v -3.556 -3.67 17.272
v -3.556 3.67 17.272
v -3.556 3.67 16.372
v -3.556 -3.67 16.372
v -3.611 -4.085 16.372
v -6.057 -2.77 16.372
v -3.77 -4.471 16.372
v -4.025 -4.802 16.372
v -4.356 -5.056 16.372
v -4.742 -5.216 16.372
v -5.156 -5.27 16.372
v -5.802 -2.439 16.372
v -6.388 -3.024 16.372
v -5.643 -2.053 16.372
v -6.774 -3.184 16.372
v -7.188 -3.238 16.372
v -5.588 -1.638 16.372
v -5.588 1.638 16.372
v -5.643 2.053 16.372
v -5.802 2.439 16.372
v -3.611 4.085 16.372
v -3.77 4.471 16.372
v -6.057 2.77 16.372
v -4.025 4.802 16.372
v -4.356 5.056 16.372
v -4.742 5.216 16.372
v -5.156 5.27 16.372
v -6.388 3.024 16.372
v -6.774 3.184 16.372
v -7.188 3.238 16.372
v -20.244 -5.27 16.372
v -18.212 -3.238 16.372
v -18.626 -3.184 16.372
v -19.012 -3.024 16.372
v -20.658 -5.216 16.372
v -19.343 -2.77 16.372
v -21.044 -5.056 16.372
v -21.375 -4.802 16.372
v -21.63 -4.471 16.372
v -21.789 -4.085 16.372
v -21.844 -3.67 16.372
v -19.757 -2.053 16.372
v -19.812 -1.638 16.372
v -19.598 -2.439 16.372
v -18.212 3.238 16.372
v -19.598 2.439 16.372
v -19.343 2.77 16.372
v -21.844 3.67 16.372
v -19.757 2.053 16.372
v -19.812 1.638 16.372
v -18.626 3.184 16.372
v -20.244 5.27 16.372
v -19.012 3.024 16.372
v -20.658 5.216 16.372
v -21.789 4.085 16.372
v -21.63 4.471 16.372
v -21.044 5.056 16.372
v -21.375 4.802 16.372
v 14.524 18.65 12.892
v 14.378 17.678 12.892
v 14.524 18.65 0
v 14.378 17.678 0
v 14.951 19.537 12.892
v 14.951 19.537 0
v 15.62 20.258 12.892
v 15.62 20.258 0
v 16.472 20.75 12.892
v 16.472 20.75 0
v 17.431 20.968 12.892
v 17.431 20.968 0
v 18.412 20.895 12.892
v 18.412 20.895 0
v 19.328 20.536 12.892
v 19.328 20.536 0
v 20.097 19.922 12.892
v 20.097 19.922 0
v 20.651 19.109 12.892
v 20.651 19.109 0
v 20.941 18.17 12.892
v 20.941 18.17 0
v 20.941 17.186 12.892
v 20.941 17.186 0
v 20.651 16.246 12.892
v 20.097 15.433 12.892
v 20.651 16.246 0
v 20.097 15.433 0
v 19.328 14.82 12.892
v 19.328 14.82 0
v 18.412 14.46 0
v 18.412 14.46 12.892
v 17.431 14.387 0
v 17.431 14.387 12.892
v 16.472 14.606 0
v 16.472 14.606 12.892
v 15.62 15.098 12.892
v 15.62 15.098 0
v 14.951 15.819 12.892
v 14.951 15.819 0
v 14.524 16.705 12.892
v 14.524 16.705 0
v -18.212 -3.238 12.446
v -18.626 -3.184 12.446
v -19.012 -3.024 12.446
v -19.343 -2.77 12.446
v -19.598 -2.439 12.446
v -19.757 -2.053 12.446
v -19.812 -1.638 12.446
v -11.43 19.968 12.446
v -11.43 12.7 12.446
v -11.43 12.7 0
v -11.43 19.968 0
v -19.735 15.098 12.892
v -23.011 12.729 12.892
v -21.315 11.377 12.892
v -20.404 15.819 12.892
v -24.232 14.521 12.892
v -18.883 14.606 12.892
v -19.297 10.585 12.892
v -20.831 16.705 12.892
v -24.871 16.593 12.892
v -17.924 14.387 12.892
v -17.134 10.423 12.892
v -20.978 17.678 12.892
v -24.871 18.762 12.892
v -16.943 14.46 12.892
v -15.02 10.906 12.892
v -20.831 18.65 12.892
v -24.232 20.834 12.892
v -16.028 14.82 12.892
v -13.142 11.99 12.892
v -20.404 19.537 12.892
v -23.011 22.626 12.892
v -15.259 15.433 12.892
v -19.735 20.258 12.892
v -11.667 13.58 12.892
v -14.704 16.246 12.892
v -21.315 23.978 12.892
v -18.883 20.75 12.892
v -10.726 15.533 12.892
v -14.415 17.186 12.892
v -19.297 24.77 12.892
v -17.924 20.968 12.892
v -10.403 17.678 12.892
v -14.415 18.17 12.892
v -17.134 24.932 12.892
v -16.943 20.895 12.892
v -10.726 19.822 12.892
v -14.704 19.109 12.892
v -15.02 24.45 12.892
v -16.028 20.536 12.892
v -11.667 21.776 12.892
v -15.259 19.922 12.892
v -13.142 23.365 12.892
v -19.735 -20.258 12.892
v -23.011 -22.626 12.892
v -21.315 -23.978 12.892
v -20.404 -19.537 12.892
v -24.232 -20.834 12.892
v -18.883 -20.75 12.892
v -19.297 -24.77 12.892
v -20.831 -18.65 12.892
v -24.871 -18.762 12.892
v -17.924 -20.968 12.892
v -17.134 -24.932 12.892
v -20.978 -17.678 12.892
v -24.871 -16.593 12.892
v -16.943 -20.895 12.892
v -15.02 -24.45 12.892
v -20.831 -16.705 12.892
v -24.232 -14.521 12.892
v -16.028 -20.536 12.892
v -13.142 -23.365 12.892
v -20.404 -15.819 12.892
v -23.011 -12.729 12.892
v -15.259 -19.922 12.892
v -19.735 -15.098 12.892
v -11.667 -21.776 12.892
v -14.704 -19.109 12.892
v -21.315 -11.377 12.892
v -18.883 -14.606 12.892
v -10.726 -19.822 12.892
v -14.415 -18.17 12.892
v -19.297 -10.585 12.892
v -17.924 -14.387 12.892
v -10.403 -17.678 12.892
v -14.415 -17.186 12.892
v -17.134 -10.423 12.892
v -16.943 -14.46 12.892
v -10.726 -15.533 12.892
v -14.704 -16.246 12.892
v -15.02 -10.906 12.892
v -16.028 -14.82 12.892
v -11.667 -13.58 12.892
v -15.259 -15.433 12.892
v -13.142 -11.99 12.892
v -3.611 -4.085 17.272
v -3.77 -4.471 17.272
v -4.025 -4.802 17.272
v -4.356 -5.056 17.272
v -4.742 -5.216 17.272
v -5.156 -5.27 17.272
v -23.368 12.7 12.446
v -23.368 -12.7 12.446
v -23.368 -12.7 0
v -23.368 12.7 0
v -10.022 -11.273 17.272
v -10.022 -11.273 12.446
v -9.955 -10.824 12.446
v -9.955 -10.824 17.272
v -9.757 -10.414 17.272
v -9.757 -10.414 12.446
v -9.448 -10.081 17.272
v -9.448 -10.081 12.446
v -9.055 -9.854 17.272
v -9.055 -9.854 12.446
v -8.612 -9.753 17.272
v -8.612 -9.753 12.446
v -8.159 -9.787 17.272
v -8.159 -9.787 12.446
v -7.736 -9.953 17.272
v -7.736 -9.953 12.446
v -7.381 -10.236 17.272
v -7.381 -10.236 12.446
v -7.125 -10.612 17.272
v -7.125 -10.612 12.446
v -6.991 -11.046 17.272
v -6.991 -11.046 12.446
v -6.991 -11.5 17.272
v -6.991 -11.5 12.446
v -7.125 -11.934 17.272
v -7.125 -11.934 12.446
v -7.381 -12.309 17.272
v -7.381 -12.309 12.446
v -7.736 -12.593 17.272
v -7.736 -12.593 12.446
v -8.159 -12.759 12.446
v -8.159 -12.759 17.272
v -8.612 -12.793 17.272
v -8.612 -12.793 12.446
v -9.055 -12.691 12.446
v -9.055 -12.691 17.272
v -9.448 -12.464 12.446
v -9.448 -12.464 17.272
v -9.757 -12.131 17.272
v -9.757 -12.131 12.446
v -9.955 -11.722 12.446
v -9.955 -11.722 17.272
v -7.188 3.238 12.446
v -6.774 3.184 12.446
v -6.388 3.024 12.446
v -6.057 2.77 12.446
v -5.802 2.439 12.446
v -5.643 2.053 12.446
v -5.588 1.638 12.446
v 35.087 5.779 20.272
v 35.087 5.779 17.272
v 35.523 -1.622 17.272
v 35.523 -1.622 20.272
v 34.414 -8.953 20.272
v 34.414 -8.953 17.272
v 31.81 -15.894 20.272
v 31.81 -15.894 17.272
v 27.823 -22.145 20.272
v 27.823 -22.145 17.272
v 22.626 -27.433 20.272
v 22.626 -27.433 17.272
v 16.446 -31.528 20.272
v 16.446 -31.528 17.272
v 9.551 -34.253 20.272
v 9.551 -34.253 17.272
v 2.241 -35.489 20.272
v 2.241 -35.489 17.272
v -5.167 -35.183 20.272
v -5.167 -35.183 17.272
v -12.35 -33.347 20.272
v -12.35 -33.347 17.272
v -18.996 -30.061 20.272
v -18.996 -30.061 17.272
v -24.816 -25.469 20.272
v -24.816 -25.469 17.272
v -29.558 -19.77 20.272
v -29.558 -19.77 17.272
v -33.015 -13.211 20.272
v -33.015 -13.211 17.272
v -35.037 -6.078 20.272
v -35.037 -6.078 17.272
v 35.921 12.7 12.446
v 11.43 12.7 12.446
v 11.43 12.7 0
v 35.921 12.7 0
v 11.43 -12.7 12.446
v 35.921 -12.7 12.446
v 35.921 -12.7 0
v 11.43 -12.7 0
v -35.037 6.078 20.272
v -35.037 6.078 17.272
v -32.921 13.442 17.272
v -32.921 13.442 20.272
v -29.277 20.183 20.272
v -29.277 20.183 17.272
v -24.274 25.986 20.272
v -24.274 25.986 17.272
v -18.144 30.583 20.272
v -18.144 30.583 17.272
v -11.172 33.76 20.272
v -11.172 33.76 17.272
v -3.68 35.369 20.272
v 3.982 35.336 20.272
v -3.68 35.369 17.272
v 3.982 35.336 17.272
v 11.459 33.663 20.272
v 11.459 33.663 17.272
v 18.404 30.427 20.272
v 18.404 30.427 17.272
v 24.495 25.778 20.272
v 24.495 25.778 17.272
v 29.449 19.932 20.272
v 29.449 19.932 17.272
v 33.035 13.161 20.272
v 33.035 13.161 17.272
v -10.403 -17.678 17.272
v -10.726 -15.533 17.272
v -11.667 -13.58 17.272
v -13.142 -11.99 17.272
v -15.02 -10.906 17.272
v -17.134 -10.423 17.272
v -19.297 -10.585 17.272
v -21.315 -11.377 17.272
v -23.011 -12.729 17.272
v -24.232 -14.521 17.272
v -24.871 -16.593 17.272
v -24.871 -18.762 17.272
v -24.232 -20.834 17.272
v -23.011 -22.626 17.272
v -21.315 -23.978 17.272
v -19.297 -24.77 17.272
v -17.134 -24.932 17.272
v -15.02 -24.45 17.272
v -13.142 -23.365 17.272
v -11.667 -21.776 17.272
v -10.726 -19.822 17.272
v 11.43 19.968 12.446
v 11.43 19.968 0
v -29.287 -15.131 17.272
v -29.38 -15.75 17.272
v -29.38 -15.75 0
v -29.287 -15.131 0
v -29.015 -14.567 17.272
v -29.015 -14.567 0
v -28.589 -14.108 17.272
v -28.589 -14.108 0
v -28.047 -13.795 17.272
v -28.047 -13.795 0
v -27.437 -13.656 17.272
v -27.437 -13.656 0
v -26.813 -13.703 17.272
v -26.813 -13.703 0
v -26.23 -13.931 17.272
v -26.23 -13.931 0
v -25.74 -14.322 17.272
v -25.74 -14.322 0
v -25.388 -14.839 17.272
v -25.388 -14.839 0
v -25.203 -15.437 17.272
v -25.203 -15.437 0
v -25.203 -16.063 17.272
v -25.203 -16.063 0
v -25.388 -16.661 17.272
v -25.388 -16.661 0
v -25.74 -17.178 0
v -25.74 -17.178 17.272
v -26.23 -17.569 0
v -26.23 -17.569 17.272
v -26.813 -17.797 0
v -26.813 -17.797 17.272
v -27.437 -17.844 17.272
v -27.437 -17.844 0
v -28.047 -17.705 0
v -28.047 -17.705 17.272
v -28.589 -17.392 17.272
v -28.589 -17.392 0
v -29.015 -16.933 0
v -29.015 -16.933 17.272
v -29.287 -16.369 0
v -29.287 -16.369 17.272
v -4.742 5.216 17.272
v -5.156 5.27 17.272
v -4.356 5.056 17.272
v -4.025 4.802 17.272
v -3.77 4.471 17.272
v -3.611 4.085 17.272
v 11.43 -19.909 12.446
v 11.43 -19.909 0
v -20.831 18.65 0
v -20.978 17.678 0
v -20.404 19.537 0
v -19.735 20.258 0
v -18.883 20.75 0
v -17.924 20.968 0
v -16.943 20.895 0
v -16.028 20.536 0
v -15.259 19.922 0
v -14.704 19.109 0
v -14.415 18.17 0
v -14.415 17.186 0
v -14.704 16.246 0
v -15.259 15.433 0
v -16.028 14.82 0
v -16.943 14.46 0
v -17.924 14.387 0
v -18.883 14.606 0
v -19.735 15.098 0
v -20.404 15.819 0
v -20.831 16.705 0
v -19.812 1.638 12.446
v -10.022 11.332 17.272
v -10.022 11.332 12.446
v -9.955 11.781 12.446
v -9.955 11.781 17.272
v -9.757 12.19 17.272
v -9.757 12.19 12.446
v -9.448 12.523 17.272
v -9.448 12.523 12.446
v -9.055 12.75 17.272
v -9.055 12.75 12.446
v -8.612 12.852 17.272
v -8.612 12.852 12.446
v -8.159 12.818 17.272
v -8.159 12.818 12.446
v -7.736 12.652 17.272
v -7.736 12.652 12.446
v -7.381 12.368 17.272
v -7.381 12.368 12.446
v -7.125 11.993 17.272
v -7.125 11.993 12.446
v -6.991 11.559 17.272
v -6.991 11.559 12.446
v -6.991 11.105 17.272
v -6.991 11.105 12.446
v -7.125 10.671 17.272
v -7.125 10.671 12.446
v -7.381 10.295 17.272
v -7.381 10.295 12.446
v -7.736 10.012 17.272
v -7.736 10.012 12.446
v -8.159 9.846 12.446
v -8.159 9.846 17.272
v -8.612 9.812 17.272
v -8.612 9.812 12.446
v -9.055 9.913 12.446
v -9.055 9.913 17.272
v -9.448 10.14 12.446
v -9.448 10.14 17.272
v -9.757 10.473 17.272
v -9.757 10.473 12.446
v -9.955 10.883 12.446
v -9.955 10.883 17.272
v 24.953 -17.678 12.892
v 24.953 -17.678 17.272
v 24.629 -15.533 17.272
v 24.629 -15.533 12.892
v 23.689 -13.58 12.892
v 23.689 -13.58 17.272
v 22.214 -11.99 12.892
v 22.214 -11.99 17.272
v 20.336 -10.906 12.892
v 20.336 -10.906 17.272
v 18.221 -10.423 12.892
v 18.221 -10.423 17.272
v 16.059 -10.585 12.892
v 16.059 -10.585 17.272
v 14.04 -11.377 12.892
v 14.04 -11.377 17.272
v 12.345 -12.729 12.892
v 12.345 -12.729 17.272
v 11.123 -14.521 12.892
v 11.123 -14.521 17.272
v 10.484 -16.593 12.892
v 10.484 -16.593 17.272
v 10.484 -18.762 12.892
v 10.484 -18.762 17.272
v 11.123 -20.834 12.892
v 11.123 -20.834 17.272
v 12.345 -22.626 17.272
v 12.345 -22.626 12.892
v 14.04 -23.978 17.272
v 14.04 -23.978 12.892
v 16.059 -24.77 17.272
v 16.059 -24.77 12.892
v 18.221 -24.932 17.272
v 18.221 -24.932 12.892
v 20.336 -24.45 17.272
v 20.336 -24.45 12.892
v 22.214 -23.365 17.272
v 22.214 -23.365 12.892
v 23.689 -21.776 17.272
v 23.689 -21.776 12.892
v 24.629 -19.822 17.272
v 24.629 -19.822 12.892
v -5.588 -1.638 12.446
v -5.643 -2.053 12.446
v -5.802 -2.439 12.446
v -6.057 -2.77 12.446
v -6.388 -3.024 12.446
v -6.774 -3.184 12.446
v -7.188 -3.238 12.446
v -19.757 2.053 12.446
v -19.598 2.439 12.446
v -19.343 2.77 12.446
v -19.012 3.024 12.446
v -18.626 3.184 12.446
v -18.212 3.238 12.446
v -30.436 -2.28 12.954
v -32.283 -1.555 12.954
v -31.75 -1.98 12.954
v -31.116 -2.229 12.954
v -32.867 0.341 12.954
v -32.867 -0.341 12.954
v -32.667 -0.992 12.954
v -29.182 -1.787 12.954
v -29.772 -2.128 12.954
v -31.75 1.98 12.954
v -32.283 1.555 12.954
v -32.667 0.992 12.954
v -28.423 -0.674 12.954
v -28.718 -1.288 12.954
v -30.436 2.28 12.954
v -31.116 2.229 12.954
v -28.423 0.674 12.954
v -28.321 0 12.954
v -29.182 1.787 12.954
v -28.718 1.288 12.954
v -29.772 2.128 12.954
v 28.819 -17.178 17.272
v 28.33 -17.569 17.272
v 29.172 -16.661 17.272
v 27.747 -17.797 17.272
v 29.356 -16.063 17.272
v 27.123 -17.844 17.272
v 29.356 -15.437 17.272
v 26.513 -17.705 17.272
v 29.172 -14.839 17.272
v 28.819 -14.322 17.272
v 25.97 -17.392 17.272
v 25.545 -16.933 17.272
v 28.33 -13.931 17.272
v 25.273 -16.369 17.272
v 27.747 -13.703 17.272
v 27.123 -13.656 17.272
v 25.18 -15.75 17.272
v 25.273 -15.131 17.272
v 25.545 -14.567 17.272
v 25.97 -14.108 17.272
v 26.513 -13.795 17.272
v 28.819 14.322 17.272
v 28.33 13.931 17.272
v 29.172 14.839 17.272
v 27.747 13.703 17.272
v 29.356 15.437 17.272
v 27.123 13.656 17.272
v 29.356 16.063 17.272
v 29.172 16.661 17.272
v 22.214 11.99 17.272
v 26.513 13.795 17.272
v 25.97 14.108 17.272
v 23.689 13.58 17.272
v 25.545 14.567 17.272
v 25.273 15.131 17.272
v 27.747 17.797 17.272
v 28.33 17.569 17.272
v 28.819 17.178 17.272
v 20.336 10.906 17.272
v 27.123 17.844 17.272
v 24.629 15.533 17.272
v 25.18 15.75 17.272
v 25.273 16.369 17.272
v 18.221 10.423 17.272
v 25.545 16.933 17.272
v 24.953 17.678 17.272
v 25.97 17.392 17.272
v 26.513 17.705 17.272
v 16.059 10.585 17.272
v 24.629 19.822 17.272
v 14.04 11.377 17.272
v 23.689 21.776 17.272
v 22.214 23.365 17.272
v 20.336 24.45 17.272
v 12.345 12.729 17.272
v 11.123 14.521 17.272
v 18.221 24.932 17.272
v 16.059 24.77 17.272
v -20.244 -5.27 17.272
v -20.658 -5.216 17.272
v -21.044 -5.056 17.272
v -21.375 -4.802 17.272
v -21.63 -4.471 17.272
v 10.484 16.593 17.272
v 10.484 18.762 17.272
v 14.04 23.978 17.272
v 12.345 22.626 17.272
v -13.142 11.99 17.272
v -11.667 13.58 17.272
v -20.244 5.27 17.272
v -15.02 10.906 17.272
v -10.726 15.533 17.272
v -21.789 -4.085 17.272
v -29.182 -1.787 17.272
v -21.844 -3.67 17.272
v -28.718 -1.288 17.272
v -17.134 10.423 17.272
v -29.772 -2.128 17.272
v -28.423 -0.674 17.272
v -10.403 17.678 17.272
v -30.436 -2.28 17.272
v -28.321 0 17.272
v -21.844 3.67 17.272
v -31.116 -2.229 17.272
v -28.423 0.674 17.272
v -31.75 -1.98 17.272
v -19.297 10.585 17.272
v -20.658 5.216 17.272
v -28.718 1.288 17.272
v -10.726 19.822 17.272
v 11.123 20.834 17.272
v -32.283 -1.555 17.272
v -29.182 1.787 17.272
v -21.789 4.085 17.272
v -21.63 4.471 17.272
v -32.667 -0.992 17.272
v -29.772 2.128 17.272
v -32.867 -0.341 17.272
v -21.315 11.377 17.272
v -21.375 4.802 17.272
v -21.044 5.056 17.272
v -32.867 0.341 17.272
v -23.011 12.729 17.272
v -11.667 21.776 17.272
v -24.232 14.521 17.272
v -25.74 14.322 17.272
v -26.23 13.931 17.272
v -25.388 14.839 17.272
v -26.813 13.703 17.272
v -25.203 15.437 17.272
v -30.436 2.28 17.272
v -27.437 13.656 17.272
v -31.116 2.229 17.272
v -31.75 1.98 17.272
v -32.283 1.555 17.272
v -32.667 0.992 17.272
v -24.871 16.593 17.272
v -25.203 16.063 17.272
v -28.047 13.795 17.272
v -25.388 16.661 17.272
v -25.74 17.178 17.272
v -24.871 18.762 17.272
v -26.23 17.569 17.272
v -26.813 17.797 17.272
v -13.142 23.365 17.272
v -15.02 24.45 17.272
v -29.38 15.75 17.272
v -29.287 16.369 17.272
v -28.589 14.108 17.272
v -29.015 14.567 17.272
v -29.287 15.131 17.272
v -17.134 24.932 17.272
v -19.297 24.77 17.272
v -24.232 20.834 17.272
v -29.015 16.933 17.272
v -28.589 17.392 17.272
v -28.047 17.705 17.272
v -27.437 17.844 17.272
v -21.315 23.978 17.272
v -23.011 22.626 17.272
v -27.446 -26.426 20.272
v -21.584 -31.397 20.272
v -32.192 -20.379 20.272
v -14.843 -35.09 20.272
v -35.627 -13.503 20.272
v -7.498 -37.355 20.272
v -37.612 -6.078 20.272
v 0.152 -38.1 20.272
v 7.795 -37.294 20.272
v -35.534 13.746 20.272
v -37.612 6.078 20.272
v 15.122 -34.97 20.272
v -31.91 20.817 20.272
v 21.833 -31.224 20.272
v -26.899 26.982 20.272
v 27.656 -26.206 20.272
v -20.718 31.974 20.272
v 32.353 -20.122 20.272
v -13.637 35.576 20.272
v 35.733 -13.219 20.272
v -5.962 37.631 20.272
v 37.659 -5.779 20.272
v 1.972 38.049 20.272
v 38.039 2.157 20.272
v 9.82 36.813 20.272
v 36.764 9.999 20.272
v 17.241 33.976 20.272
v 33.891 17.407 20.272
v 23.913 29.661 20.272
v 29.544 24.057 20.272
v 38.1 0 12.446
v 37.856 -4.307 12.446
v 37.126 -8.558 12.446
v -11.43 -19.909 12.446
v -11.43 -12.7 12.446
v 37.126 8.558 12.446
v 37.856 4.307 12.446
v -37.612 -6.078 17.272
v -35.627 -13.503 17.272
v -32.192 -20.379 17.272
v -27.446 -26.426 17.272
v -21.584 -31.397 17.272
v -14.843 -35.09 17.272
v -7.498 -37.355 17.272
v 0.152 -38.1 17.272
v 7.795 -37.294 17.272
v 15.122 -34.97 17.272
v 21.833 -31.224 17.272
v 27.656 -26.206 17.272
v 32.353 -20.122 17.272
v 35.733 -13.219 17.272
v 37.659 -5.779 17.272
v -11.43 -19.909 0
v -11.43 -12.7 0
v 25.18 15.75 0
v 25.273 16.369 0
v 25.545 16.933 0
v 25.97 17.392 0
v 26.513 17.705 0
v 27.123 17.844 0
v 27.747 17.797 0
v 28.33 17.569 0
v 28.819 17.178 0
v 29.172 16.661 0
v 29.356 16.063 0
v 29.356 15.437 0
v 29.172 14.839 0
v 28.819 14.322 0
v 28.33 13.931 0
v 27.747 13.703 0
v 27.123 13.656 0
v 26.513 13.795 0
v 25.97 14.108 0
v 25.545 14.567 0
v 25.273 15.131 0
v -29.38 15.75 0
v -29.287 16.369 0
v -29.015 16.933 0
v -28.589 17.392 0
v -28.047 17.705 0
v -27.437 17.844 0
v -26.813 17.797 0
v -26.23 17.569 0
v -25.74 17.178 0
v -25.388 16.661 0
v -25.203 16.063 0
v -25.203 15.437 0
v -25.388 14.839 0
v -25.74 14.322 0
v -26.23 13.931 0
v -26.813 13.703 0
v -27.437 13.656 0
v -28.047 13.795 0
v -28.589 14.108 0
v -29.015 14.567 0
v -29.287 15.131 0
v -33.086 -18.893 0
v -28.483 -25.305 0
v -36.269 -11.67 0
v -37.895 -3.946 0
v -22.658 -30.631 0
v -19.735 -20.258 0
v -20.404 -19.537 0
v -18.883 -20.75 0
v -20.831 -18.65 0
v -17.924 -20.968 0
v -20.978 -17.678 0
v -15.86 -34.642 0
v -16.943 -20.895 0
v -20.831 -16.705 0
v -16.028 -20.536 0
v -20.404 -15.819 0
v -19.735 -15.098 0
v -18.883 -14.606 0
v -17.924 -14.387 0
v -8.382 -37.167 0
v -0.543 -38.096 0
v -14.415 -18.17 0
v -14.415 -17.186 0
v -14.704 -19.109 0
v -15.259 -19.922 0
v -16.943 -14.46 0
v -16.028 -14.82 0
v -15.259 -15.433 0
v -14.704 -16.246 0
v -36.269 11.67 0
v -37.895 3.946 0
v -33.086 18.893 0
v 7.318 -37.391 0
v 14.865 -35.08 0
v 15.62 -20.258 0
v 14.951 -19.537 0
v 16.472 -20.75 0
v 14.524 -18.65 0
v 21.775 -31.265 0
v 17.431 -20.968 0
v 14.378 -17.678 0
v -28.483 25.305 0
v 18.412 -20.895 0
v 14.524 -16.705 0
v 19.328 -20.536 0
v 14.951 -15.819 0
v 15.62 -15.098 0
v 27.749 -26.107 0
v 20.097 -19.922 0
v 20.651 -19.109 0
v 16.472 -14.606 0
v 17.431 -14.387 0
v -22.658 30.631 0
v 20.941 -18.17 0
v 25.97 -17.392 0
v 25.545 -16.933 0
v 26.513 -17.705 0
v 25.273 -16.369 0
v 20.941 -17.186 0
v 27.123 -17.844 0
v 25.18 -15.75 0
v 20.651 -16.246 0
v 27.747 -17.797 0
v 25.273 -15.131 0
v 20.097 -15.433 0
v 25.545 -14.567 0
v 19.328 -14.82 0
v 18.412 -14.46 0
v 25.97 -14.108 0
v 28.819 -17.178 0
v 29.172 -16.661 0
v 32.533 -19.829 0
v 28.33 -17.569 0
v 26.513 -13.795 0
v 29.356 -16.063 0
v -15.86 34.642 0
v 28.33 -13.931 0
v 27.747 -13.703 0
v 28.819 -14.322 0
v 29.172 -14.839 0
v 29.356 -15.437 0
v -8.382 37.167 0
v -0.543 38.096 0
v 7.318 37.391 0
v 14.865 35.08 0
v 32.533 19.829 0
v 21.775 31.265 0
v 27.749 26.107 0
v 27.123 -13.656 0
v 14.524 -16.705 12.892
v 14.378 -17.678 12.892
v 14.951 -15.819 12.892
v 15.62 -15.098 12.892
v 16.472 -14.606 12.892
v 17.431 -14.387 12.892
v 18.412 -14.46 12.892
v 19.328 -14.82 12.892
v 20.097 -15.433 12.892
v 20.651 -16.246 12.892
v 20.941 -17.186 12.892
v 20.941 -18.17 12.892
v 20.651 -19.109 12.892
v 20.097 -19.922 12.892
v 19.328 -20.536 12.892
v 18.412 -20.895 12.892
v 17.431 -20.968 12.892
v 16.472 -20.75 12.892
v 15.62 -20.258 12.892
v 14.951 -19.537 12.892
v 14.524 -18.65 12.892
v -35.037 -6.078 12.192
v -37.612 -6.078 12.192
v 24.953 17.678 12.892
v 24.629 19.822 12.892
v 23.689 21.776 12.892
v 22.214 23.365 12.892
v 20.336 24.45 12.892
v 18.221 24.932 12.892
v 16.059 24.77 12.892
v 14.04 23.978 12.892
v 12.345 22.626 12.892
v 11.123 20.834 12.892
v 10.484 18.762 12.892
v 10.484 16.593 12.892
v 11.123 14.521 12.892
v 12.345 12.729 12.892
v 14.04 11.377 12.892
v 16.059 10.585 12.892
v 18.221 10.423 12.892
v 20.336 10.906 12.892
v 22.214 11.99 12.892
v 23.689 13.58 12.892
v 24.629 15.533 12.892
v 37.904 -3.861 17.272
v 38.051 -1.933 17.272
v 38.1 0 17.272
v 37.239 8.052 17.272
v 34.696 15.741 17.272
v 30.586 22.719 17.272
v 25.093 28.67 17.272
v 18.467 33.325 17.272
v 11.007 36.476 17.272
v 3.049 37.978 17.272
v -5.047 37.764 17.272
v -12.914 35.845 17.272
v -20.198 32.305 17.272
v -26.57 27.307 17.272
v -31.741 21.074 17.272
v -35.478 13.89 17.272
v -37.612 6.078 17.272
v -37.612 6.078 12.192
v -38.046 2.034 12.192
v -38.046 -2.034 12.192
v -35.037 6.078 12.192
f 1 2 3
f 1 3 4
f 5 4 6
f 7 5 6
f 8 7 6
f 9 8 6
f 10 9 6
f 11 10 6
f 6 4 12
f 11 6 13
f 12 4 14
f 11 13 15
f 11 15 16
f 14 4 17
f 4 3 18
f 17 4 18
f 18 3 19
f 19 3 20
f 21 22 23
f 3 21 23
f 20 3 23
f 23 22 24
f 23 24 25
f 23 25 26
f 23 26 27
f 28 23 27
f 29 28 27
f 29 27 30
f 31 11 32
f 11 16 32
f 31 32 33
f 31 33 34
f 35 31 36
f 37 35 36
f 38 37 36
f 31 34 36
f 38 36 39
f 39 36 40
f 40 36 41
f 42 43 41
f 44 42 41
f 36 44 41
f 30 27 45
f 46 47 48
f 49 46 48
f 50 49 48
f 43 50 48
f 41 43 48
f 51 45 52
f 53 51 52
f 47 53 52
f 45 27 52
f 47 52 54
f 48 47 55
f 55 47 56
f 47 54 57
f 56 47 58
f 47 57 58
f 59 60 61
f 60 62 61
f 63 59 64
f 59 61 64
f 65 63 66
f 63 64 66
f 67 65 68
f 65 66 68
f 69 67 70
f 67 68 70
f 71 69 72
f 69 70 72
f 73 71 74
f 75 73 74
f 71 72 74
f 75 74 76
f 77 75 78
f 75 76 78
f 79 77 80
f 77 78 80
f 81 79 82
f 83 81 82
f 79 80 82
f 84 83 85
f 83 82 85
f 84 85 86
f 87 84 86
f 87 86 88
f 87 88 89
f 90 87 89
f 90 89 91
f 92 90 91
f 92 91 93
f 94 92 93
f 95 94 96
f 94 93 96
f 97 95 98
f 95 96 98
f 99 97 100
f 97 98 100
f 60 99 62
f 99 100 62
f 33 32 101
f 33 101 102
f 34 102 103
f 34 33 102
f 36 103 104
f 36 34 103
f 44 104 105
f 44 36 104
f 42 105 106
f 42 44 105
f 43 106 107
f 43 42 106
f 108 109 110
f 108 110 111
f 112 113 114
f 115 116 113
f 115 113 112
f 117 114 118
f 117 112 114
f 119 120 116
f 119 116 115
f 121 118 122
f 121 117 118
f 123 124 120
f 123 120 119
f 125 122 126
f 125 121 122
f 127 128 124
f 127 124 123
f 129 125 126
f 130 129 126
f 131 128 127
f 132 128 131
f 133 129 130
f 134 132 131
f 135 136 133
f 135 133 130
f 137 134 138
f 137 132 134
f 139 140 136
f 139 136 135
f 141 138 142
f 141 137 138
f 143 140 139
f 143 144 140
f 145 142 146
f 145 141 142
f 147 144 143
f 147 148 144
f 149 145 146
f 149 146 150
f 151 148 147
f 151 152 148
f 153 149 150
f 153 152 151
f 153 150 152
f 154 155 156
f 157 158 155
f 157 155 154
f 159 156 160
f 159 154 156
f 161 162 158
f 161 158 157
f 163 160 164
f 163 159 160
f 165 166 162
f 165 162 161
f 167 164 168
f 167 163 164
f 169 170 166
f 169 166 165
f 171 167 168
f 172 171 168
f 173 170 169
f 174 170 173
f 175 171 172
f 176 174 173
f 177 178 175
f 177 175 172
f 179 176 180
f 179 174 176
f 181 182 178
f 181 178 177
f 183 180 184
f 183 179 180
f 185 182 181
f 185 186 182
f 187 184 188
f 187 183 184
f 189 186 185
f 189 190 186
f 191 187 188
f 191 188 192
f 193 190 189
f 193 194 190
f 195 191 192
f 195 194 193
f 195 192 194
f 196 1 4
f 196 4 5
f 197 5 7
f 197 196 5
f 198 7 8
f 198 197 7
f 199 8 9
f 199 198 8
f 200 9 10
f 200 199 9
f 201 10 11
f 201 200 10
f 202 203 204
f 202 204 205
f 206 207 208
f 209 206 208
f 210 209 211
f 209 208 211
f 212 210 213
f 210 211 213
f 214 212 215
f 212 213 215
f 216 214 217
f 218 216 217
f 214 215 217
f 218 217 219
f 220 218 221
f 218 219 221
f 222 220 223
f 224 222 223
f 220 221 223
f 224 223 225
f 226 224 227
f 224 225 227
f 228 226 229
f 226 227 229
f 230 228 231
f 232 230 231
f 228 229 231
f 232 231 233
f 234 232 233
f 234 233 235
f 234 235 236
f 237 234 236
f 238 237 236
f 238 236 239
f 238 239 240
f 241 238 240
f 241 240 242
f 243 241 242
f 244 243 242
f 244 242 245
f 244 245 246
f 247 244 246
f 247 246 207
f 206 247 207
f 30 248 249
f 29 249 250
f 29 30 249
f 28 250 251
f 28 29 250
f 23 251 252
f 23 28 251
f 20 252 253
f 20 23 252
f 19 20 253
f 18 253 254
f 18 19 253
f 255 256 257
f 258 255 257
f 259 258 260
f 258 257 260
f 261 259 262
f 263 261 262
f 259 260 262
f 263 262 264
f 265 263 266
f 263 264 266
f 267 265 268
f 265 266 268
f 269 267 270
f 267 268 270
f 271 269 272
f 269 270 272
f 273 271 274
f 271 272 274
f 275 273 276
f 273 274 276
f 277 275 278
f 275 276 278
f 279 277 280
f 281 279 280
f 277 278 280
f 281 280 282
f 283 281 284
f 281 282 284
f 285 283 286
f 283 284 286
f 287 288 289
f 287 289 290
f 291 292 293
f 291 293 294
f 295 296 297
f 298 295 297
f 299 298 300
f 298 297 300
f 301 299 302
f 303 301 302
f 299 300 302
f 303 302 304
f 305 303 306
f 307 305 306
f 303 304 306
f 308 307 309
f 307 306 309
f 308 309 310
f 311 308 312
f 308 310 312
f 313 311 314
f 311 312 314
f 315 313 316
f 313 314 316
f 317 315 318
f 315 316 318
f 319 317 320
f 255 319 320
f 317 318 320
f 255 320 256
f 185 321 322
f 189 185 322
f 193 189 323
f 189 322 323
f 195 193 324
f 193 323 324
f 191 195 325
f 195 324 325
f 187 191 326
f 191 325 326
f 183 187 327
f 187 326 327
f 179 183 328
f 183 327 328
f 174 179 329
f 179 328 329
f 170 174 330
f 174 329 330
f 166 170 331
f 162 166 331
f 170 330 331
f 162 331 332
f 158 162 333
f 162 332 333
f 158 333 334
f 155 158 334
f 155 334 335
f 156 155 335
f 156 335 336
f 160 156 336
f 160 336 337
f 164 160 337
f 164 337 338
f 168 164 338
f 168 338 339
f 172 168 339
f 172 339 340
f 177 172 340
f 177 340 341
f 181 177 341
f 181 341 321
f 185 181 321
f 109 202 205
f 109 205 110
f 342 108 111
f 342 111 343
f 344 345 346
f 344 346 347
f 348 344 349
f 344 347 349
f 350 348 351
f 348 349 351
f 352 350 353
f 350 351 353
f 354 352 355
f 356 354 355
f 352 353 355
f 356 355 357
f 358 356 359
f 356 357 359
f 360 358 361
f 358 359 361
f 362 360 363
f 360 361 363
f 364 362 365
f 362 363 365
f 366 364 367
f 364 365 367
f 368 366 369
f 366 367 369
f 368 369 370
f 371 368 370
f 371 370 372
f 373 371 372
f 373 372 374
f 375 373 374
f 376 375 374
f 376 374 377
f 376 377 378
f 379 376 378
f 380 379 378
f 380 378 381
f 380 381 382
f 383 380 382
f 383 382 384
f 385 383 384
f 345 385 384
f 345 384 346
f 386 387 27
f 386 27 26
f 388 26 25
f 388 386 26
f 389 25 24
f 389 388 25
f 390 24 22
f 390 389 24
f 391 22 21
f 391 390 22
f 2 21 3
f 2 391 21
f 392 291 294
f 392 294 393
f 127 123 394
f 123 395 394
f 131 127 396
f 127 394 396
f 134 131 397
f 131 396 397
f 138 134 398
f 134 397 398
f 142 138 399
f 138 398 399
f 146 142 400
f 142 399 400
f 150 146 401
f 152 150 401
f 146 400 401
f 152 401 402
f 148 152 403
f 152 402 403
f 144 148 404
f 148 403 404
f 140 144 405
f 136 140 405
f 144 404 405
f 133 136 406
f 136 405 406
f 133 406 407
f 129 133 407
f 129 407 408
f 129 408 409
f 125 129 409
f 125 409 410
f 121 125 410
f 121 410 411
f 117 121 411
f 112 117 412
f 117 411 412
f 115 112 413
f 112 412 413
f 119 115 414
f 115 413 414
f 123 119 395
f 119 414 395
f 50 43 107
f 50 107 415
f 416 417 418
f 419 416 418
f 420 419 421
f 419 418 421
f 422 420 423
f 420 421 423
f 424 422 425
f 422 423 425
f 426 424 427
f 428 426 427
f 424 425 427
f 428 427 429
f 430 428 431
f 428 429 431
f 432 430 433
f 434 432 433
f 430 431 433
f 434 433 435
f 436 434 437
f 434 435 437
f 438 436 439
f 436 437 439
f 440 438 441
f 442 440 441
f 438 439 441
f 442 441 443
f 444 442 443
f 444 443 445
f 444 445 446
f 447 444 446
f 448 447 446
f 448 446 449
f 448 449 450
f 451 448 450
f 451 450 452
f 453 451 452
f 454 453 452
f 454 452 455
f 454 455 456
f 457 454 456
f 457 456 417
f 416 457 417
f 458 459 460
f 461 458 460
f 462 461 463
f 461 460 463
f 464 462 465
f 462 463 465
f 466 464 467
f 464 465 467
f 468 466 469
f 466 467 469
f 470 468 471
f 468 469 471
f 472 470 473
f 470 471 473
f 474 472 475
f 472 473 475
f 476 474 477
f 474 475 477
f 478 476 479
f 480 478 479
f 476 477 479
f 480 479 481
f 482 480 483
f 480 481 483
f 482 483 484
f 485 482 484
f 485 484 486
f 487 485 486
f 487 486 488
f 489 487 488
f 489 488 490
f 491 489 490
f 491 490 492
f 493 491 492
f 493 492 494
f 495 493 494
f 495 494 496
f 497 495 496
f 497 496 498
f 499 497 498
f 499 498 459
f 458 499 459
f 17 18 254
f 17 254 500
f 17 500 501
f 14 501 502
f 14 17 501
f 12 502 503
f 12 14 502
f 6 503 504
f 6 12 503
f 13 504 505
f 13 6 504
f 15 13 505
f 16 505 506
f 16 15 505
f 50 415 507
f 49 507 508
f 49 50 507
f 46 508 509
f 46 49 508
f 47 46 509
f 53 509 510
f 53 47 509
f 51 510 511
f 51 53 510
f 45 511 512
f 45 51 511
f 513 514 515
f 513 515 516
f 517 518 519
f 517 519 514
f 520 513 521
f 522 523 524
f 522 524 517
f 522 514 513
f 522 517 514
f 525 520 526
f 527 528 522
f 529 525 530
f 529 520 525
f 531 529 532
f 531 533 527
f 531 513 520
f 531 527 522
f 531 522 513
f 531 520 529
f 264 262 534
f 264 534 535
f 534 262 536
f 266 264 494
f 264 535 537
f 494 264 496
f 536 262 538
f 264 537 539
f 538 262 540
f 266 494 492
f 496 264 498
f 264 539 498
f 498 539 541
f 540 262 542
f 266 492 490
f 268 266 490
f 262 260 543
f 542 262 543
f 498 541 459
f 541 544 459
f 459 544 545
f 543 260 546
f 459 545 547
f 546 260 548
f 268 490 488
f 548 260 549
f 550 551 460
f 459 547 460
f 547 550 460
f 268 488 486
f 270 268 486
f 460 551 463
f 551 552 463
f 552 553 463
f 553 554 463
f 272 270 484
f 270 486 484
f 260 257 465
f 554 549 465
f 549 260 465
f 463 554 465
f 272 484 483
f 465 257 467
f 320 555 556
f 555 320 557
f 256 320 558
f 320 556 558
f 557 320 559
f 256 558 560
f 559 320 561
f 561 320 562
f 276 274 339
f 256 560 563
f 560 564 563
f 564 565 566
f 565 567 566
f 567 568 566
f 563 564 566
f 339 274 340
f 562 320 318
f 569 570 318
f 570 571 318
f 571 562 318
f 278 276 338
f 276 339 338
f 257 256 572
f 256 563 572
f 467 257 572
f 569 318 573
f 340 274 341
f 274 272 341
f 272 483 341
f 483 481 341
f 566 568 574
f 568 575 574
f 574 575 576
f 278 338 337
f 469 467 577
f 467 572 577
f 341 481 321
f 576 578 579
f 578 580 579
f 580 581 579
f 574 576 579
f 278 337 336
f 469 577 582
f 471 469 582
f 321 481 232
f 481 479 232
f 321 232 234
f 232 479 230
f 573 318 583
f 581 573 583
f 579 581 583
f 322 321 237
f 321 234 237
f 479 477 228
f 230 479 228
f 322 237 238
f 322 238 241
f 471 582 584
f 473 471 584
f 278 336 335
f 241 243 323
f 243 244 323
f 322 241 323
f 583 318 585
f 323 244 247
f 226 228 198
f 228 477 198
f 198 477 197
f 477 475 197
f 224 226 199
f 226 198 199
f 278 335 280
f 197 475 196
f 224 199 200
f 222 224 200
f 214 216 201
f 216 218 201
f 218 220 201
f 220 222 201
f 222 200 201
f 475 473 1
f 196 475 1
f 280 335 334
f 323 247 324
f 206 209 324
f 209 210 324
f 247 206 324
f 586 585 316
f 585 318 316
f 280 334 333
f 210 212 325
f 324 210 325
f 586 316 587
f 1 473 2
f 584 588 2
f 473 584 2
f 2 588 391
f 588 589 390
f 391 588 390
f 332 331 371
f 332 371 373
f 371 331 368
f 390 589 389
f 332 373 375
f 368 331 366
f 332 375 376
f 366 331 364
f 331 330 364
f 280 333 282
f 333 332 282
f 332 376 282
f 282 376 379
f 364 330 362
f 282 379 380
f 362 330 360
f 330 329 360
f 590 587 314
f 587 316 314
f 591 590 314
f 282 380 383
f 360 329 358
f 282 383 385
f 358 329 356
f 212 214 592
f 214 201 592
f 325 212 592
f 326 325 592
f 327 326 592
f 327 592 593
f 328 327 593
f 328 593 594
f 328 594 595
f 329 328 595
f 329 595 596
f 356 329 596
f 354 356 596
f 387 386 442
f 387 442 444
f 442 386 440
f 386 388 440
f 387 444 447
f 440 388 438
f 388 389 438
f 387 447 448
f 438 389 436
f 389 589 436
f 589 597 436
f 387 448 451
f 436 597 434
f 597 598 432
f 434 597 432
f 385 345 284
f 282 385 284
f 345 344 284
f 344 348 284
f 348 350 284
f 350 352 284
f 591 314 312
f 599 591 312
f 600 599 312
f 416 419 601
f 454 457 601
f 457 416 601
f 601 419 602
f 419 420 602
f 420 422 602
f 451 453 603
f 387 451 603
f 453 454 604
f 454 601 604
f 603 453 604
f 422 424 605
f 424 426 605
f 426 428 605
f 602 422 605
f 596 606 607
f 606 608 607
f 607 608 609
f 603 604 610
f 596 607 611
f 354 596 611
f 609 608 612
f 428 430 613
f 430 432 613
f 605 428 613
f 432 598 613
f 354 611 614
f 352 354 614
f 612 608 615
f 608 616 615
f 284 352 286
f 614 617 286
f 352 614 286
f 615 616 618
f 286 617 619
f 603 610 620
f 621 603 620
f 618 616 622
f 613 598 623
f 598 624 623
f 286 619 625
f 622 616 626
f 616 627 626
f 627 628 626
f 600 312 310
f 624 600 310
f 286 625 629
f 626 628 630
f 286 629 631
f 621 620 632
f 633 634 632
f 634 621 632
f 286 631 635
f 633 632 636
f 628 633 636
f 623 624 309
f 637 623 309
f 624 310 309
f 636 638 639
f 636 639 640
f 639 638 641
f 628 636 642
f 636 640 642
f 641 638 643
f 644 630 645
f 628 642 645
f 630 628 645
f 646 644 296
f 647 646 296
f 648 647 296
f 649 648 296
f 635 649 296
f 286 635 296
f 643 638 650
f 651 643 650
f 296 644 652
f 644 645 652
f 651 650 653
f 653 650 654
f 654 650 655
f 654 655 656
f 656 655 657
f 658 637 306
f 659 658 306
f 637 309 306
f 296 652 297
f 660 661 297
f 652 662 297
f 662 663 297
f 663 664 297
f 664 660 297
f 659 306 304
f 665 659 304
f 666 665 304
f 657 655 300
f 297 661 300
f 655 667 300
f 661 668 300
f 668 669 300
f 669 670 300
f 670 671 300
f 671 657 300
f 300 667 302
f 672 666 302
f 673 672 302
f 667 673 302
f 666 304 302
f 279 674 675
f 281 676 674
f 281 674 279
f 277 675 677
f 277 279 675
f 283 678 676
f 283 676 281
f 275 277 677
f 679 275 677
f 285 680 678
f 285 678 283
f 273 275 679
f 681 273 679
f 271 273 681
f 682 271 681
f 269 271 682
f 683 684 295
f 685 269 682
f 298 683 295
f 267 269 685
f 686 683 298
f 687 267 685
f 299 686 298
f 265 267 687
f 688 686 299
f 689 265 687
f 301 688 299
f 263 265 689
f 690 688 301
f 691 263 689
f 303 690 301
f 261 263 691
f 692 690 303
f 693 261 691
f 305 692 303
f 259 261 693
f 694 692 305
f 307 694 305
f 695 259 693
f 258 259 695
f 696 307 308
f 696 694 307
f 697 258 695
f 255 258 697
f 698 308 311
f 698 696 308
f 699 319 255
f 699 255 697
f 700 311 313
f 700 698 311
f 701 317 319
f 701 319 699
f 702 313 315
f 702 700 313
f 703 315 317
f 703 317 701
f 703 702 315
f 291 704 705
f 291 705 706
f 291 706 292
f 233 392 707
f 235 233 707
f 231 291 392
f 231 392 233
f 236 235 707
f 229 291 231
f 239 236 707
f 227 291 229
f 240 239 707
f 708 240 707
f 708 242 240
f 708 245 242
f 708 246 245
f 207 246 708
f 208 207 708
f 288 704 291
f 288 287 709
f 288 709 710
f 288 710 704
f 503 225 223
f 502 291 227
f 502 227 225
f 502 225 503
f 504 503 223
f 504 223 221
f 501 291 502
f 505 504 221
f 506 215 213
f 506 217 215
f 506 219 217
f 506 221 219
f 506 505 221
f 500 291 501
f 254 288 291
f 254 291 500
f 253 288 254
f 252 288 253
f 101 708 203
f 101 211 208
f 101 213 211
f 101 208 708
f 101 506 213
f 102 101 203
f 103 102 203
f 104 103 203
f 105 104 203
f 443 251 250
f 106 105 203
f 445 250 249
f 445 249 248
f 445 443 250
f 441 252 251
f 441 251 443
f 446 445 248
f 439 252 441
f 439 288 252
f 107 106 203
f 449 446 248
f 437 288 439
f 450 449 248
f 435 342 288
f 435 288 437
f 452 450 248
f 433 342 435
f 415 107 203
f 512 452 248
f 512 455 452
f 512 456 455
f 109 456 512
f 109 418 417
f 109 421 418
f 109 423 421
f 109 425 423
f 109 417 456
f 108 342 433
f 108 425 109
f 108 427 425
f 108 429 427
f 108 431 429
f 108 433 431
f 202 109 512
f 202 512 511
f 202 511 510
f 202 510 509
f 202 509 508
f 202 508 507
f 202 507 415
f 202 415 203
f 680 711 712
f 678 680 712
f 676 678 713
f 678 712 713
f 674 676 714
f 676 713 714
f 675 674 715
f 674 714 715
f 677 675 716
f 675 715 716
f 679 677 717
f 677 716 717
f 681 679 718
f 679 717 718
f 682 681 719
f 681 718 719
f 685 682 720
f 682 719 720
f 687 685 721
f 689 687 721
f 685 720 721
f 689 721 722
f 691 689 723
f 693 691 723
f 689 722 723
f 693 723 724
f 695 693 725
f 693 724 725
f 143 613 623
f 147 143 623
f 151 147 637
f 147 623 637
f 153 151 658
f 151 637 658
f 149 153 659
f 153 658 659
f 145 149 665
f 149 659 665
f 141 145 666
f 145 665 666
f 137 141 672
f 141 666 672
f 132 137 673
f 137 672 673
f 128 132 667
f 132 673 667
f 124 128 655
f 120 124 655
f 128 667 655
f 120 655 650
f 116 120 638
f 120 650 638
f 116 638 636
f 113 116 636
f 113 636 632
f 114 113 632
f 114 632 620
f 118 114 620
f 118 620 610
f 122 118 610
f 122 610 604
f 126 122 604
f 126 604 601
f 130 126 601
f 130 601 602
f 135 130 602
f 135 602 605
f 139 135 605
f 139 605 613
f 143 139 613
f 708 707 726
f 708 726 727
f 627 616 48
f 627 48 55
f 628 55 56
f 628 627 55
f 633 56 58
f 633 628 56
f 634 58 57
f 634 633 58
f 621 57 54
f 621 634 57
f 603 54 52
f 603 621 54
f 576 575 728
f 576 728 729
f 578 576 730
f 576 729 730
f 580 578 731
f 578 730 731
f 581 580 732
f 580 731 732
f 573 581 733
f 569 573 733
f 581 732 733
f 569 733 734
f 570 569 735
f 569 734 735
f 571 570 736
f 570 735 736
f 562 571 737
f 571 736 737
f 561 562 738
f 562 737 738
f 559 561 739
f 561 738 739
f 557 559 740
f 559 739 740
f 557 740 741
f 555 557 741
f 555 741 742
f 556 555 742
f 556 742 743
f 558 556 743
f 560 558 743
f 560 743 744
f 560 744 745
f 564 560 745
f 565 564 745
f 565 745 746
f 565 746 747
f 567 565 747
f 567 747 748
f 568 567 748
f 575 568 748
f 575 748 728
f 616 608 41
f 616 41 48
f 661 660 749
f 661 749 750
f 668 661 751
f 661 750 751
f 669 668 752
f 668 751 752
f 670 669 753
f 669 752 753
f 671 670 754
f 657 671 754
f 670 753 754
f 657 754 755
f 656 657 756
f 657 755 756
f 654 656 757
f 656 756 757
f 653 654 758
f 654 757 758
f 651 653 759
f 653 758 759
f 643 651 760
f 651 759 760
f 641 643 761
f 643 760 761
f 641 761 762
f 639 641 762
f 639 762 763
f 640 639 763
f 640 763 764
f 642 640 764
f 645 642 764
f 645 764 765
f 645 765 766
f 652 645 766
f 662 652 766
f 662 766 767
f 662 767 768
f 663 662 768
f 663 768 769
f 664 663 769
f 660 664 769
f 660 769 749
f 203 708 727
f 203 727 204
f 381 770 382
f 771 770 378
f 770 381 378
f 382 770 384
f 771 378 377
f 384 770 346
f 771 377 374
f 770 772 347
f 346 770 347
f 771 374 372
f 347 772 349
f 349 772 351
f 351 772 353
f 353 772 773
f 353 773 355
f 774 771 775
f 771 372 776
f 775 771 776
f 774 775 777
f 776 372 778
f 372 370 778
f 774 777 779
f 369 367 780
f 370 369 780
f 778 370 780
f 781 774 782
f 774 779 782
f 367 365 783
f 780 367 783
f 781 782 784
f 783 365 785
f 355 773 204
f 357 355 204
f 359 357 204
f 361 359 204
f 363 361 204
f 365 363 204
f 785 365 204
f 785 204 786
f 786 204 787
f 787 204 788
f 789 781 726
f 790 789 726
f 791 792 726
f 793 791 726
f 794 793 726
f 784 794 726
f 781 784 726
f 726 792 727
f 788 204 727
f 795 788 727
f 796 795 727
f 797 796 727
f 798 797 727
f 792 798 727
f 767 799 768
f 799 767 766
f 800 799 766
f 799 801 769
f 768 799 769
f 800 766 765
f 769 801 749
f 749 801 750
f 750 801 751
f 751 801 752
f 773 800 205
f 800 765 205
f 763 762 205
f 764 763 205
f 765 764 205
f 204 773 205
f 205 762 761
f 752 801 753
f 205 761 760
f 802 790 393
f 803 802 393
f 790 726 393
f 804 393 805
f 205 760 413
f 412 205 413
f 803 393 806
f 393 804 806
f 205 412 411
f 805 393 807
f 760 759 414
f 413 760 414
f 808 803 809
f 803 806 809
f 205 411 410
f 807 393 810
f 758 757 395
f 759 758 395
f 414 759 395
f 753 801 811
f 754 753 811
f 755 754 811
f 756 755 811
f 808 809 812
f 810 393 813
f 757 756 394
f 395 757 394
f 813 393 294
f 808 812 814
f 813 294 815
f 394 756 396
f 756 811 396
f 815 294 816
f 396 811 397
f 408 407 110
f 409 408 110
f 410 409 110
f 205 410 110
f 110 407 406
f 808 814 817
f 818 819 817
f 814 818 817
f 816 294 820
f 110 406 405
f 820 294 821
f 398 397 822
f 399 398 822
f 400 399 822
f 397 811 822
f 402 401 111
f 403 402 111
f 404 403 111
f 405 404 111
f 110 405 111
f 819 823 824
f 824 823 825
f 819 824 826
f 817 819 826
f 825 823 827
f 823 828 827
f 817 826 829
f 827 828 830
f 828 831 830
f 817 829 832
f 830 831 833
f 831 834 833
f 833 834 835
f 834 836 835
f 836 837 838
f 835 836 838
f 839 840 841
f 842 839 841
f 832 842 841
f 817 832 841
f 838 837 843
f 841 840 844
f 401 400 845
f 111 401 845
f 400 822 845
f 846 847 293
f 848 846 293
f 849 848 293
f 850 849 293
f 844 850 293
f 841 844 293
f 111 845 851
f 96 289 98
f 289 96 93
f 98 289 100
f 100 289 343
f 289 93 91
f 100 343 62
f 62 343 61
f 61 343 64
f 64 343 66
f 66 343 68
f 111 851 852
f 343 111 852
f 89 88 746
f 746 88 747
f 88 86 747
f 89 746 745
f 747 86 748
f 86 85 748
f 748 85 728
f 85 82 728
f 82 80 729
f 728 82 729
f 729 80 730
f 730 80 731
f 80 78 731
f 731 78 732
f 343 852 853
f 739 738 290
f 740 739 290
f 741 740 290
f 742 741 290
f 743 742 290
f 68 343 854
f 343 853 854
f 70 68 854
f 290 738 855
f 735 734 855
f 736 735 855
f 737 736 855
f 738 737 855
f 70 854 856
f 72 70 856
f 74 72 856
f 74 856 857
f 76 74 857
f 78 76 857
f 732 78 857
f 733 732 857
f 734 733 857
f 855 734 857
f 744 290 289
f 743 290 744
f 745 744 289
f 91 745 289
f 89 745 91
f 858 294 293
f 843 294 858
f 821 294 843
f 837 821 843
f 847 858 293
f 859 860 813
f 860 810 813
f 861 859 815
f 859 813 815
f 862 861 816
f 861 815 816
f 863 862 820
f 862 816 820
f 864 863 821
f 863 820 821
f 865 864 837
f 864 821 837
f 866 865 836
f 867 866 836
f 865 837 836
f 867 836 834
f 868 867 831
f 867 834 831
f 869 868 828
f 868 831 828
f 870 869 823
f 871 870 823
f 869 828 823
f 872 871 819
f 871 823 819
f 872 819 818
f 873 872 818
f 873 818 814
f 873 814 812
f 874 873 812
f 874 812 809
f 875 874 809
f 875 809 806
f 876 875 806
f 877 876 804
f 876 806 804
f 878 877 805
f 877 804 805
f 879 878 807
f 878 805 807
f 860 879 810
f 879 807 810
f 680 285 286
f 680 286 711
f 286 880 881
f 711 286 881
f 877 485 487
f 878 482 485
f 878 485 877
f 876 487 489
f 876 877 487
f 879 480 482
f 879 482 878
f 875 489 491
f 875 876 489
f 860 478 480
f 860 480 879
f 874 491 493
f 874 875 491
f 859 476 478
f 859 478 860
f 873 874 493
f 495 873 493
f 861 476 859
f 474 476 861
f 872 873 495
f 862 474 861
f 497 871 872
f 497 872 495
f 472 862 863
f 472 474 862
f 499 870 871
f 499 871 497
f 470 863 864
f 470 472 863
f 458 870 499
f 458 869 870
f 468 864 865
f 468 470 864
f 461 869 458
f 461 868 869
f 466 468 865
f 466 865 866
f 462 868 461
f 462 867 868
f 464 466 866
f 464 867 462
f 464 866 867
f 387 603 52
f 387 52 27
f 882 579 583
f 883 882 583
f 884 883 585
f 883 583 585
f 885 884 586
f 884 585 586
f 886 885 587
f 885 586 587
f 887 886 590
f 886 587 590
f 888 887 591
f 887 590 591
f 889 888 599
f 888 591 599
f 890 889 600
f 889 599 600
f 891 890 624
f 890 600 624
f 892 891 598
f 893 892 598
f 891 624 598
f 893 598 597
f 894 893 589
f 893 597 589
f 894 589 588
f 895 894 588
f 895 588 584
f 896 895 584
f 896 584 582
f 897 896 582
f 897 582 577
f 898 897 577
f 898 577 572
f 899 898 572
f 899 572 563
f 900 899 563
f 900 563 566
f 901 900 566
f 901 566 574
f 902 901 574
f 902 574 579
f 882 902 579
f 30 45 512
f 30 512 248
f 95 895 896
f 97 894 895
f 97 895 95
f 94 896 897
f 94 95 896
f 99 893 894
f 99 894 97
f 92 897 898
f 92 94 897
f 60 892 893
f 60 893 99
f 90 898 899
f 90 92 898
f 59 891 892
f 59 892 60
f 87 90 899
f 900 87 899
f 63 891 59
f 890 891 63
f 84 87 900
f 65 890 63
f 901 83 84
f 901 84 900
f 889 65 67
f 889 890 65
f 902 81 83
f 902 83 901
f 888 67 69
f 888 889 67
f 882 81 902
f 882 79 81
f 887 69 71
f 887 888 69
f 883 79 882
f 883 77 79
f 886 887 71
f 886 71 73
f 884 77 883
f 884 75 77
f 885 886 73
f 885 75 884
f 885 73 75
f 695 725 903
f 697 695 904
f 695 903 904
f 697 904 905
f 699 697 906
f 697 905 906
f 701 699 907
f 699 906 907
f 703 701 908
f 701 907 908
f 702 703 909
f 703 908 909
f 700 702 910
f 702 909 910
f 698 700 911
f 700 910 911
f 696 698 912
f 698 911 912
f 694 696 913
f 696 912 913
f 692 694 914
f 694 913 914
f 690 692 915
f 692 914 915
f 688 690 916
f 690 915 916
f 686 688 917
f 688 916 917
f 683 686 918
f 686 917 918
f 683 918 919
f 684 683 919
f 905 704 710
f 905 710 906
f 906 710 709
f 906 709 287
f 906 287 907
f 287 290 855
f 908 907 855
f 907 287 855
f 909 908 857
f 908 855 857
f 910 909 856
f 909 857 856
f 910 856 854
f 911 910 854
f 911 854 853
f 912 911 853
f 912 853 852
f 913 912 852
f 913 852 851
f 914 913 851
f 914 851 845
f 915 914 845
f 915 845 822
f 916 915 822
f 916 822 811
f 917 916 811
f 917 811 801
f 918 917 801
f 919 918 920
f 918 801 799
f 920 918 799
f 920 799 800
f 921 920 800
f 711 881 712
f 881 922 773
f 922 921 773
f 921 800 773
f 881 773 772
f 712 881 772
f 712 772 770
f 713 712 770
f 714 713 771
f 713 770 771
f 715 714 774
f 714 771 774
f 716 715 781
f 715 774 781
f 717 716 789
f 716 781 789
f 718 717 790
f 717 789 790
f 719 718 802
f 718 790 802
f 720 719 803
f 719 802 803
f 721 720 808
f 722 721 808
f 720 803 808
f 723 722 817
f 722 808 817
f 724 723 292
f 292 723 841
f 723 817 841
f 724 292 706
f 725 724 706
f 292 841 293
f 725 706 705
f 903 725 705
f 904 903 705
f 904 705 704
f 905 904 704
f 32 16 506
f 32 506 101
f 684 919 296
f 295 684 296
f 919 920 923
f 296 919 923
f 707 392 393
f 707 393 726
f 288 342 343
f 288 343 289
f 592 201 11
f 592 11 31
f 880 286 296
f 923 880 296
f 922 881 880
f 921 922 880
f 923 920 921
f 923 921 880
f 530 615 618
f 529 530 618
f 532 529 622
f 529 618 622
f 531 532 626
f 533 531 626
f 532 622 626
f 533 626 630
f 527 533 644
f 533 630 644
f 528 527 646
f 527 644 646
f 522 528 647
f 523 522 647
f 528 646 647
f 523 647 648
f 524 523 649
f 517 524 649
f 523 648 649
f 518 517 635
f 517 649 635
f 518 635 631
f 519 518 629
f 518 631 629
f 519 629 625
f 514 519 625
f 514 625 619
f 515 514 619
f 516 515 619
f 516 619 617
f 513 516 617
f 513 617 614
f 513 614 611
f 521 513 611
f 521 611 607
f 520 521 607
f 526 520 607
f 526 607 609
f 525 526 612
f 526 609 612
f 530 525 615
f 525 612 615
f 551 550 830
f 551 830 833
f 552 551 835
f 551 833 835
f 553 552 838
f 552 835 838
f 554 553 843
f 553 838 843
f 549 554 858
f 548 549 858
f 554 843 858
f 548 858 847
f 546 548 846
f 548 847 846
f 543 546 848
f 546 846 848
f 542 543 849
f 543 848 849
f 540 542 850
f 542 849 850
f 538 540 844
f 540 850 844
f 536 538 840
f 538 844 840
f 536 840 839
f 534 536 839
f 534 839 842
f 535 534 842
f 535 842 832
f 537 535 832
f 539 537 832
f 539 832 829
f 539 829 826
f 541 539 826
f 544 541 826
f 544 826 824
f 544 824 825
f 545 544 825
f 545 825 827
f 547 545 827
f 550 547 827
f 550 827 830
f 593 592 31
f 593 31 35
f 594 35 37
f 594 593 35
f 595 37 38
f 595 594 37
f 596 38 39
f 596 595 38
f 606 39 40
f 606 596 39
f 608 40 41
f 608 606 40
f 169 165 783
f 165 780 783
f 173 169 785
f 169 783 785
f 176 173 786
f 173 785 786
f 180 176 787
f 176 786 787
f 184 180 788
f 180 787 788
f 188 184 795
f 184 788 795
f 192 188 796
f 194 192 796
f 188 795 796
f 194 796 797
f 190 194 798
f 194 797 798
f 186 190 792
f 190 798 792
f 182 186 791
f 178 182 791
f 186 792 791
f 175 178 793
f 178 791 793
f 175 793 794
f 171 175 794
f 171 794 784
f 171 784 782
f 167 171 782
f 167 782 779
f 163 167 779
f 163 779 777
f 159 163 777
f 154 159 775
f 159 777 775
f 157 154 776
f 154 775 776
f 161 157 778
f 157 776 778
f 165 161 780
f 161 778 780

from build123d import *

# Parameters (mm, degrees)
SKETCH1_R                               = 38.1
BOSS_EXTRUDE1_DEPTH                     = 17.272
CBORE_FOR_M6_HEX_HEAD_BOLT1_D           = 6.6
CBORE_FOR_M6_HEX_HEAD_BOLT1_CBORE_D     = 14.55
CBORE_FOR_M6_HEX_HEAD_BOLT1_CBORE_DEPTH = 4.38
SKETCH6_R                               = 1.515
PIN_FOR_M6_DEPTH                        = 17.272
M5X0_8_TAPPED_HOLE1_D                   = 4.2
SKETCH10_R                              = 1.05
SPRING_PIN_HOLE_DEPTH                   = 17.272
ALLIGNMENT_BORDER_DEPTH                 = 3
CUT_EXTRUDE2_DEPTH                      = 0.9
SKETCH16_R                              = 2.286
R_PIN_GROUNDING_DEPTH                   = 4.318
CUT_EXTRUDE3_START                      = -12.446
CUT_EXTRUDE3_DEPTH                      = 12.446
SKETCH18_W                              = 4.238089583
SKETCH18_H                              = 12.155953692
CUT_EXTRUDE4_DEPTH                      = 5.08
BOSS_EXTRUDE2_START                     = -17.272
SKETCH19_R                              = 1.515
BOSS_EXTRUDE2_DEPTH                     = 17.272
SKETCH20_R                              = 1.524
CUT_EXTRUDE5_DEPTH                      = 5.08


with BuildPart() as part:
    # Sketch1 → Boss-Extrude1 (new body)
    with BuildSketch(Plane.XY):
        Circle(SKETCH1_R)
    extrude(amount=BOSS_EXTRUDE1_DEPTH)

    # CBORE for M6 Hex Head Bolt1 (through all)
    with Locations(Plane.XY.offset(17.272)):
        with Locations((17.67766953, 17.67766953), (17.67766953, -17.67766953), (-17.67766953, -17.67766953), (-17.67766953, 17.67766953)):
            CounterBoreHole(CBORE_FOR_M6_HEX_HEAD_BOLT1_D / 2, CBORE_FOR_M6_HEX_HEAD_BOLT1_CBORE_D / 2, CBORE_FOR_M6_HEX_HEAD_BOLT1_CBORE_DEPTH)

    # Sketch6 → Pin_for_M6 (cut)
    with BuildSketch(Plane.XY.offset(17.272)):
        with Locations((-5.653014274, 24.676900213)):
            Circle(SKETCH6_R)
    extrude(amount=-PIN_FOR_M6_DEPTH, mode=Mode.SUBTRACT)

    # M5x0.8 Tapped Hole1 (through all)
    with Locations(Plane.XY.offset(17.272)):
        with Locations((27.279800219, 15.75), (-27.279800219, 15.75), (27.279800219, -15.75), (-27.279800219, -15.75)):
            Hole(M5X0_8_TAPPED_HOLE1_D / 2)

    # Sketch10 → Spring_Pin_Hole (cut)
    with BuildSketch(Plane.XY.offset(17.272)):
        with Locations((-5.653014274, 24.676900213)):
            Circle(SKETCH10_R)
        with BuildLine():
            Line((-18.212, 3.2385), (-7.188, 3.2385))
            ThreePointArc((-7.188, 3.2385), (-6.05662915, 2.76987085), (-5.588, 1.6385))
            Line((-5.588, 1.6385), (-5.588, -1.6385))
            ThreePointArc((-5.588, -1.6385), (-6.05662915, -2.76987085), (-7.188, -3.2385))
            Line((-7.188, -3.2385), (-18.212, -3.2385))
            ThreePointArc((-18.212, -3.2385), (-19.34337085, -2.76987085), (-19.812, -1.6385))
            Line((-19.812, -1.6385), (-19.812, 1.6385))
            ThreePointArc((-19.812, 1.6385), (-19.34337085, 2.76987085), (-18.212, 3.2385))
        make_face()
    extrude(amount=-SPRING_PIN_HOLE_DEPTH, mode=Mode.SUBTRACT)

    # Sketch13 → Allignment_Border (add)
    with BuildSketch(Plane.XY.offset(17.272)):
        with BuildLine():
            Line((-37.612075155, 6.077976846), (-35.036720701, 6.077976846))
            ThreePointArc((-35.036720701, 6.077976846), (0.151738272, 35.559676257), (35.087315055, 5.778747461))
            ThreePointArc((35.087315055, 5.778747461), (5.928416127, -35.06233709), (-35.036720701, -6.077976846))
            Line((-35.036720701, -6.077976846), (-37.612075155, -6.077976846))
            ThreePointArc((-37.612075155, -6.077976846), (0.15158135, -38.099698465), (37.659246703, -5.778506535))
            ThreePointArc((37.659246703, -5.778506535), (5.928288609, 37.635958792), (-37.612075155, 6.077976846))
        make_face()
    extrude(amount=ALLIGNMENT_BORDER_DEPTH)

    # Sketch15 → Cut-Extrude2 (cut)
    with BuildSketch(Plane.XY.offset(17.272)):
        with BuildLine():
            Line((-20.244, 5.2705), (-5.156, 5.2705))
            ThreePointArc((-5.156, 5.2705), (-4.02462915, 4.80187085), (-3.556, 3.6705))
            Line((-3.556, 3.6705), (-3.556, -3.6705))
            ThreePointArc((-3.556, -3.6705), (-4.02462915, -4.80187085), (-5.156, -5.2705))
            Line((-5.156, -5.2705), (-20.244, -5.2705))
            ThreePointArc((-20.244, -5.2705), (-21.37537085, -4.80187085), (-21.844, -3.6705))
            Line((-21.844, -3.6705), (-21.844, 3.6705))
            ThreePointArc((-21.844, 3.6705), (-21.37537085, 4.80187085), (-20.244, 5.2705))
        make_face()
    extrude(amount=-CUT_EXTRUDE2_DEPTH, mode=Mode.SUBTRACT)

    # Sketch16 → R_Pin_Grounding (cut)
    with BuildSketch(Plane.XY.offset(17.272)):
        with Locations((-30.607, 0)):
            Circle(SKETCH16_R)
    extrude(amount=-R_PIN_GROUNDING_DEPTH, mode=Mode.SUBTRACT)

    # Sketch17 → Cut-Extrude3 (cut)
    with BuildSketch(Plane(origin=(0, 0, 0), x_dir=(-1, 0, 0), z_dir=(0, 0, -1)).offset(CUT_EXTRUDE3_START)):
        with BuildLine():
            Line((-11.43, 12.7), (-35.921024484, 12.7))
            ThreePointArc((-35.921024484, 12.7), (-38.1, 0), (-35.921024484, -12.7))
            Line((-35.921024484, -12.7), (-11.43, -12.7))
            Line((-11.43, -12.7), (-11.43, -19.908773642))
            Line((-11.43, -19.908773642), (11.43, -19.908773642))
            Line((11.43, -19.908773642), (11.43, -12.7))
            Line((11.43, -12.7), (23.368, -12.7))
            Line((23.368, -12.7), (23.368, 12.7))
            Line((23.368, 12.7), (11.43, 12.7))
            Line((11.43, 12.7), (11.43, 19.967789095))
            Line((11.43, 19.967789095), (-11.43, 19.967789095))
            Line((-11.43, 19.967789095), (-11.43, 12.7))
        make_face()
        with BuildLine():
            ThreePointArc((7.188, -3.2385), (6.05662915, -2.76987085), (5.588, -1.6385))
            Line((5.588, -1.6385), (5.588, 1.6385))
            ThreePointArc((5.588, 1.6385), (6.05662915, 2.76987085), (7.188, 3.2385))
            Line((7.188, 3.2385), (18.212, 3.2385))
            ThreePointArc((18.212, 3.2385), (19.34337085, 2.76987085), (19.812, 1.6385))
            Line((19.812, 1.6385), (19.812, -1.6385))
            ThreePointArc((19.812, -1.6385), (19.34337085, -2.76987085), (18.212, -3.2385))
            Line((18.212, -3.2385), (7.188, -3.2385))
        make_face(mode=Mode.SUBTRACT)
    extrude(amount=CUT_EXTRUDE3_DEPTH, mode=Mode.SUBTRACT)

    # Sketch18 → Cut-Extrude4 (cut)
    with BuildSketch(Plane.XY.offset(17.272)):
        with Locations((-37.155765493, 0)):
            Rectangle(SKETCH18_W, SKETCH18_H)
    extrude(amount=-CUT_EXTRUDE4_DEPTH, mode=Mode.SUBTRACT)

    # Sketch19 → Boss-Extrude2 (add)
    with BuildSketch(Plane(origin=(0, 0, 0), x_dir=(-1, 0, 0), z_dir=(0, 0, -1)).offset(BOSS_EXTRUDE2_START)):
        with Locations((5.653014274, 24.676900213)):
            Circle(SKETCH19_R)
    extrude(amount=BOSS_EXTRUDE2_DEPTH)

    # Sketch20 → Cut-Extrude5 (cut)
    with BuildSketch(Plane(origin=(0, 0, 12.446), x_dir=(-1, 0, 0), z_dir=(0, 0, -1))):
        with Locations((8.49829012, -11.272773642)):
            Circle(SKETCH20_R)
        with Locations((8.49829012, 11.331789095)):
            Circle(SKETCH20_R)
    extrude(amount=-CUT_EXTRUDE5_DEPTH, mode=Mode.SUBTRACT)


solid = part.part
